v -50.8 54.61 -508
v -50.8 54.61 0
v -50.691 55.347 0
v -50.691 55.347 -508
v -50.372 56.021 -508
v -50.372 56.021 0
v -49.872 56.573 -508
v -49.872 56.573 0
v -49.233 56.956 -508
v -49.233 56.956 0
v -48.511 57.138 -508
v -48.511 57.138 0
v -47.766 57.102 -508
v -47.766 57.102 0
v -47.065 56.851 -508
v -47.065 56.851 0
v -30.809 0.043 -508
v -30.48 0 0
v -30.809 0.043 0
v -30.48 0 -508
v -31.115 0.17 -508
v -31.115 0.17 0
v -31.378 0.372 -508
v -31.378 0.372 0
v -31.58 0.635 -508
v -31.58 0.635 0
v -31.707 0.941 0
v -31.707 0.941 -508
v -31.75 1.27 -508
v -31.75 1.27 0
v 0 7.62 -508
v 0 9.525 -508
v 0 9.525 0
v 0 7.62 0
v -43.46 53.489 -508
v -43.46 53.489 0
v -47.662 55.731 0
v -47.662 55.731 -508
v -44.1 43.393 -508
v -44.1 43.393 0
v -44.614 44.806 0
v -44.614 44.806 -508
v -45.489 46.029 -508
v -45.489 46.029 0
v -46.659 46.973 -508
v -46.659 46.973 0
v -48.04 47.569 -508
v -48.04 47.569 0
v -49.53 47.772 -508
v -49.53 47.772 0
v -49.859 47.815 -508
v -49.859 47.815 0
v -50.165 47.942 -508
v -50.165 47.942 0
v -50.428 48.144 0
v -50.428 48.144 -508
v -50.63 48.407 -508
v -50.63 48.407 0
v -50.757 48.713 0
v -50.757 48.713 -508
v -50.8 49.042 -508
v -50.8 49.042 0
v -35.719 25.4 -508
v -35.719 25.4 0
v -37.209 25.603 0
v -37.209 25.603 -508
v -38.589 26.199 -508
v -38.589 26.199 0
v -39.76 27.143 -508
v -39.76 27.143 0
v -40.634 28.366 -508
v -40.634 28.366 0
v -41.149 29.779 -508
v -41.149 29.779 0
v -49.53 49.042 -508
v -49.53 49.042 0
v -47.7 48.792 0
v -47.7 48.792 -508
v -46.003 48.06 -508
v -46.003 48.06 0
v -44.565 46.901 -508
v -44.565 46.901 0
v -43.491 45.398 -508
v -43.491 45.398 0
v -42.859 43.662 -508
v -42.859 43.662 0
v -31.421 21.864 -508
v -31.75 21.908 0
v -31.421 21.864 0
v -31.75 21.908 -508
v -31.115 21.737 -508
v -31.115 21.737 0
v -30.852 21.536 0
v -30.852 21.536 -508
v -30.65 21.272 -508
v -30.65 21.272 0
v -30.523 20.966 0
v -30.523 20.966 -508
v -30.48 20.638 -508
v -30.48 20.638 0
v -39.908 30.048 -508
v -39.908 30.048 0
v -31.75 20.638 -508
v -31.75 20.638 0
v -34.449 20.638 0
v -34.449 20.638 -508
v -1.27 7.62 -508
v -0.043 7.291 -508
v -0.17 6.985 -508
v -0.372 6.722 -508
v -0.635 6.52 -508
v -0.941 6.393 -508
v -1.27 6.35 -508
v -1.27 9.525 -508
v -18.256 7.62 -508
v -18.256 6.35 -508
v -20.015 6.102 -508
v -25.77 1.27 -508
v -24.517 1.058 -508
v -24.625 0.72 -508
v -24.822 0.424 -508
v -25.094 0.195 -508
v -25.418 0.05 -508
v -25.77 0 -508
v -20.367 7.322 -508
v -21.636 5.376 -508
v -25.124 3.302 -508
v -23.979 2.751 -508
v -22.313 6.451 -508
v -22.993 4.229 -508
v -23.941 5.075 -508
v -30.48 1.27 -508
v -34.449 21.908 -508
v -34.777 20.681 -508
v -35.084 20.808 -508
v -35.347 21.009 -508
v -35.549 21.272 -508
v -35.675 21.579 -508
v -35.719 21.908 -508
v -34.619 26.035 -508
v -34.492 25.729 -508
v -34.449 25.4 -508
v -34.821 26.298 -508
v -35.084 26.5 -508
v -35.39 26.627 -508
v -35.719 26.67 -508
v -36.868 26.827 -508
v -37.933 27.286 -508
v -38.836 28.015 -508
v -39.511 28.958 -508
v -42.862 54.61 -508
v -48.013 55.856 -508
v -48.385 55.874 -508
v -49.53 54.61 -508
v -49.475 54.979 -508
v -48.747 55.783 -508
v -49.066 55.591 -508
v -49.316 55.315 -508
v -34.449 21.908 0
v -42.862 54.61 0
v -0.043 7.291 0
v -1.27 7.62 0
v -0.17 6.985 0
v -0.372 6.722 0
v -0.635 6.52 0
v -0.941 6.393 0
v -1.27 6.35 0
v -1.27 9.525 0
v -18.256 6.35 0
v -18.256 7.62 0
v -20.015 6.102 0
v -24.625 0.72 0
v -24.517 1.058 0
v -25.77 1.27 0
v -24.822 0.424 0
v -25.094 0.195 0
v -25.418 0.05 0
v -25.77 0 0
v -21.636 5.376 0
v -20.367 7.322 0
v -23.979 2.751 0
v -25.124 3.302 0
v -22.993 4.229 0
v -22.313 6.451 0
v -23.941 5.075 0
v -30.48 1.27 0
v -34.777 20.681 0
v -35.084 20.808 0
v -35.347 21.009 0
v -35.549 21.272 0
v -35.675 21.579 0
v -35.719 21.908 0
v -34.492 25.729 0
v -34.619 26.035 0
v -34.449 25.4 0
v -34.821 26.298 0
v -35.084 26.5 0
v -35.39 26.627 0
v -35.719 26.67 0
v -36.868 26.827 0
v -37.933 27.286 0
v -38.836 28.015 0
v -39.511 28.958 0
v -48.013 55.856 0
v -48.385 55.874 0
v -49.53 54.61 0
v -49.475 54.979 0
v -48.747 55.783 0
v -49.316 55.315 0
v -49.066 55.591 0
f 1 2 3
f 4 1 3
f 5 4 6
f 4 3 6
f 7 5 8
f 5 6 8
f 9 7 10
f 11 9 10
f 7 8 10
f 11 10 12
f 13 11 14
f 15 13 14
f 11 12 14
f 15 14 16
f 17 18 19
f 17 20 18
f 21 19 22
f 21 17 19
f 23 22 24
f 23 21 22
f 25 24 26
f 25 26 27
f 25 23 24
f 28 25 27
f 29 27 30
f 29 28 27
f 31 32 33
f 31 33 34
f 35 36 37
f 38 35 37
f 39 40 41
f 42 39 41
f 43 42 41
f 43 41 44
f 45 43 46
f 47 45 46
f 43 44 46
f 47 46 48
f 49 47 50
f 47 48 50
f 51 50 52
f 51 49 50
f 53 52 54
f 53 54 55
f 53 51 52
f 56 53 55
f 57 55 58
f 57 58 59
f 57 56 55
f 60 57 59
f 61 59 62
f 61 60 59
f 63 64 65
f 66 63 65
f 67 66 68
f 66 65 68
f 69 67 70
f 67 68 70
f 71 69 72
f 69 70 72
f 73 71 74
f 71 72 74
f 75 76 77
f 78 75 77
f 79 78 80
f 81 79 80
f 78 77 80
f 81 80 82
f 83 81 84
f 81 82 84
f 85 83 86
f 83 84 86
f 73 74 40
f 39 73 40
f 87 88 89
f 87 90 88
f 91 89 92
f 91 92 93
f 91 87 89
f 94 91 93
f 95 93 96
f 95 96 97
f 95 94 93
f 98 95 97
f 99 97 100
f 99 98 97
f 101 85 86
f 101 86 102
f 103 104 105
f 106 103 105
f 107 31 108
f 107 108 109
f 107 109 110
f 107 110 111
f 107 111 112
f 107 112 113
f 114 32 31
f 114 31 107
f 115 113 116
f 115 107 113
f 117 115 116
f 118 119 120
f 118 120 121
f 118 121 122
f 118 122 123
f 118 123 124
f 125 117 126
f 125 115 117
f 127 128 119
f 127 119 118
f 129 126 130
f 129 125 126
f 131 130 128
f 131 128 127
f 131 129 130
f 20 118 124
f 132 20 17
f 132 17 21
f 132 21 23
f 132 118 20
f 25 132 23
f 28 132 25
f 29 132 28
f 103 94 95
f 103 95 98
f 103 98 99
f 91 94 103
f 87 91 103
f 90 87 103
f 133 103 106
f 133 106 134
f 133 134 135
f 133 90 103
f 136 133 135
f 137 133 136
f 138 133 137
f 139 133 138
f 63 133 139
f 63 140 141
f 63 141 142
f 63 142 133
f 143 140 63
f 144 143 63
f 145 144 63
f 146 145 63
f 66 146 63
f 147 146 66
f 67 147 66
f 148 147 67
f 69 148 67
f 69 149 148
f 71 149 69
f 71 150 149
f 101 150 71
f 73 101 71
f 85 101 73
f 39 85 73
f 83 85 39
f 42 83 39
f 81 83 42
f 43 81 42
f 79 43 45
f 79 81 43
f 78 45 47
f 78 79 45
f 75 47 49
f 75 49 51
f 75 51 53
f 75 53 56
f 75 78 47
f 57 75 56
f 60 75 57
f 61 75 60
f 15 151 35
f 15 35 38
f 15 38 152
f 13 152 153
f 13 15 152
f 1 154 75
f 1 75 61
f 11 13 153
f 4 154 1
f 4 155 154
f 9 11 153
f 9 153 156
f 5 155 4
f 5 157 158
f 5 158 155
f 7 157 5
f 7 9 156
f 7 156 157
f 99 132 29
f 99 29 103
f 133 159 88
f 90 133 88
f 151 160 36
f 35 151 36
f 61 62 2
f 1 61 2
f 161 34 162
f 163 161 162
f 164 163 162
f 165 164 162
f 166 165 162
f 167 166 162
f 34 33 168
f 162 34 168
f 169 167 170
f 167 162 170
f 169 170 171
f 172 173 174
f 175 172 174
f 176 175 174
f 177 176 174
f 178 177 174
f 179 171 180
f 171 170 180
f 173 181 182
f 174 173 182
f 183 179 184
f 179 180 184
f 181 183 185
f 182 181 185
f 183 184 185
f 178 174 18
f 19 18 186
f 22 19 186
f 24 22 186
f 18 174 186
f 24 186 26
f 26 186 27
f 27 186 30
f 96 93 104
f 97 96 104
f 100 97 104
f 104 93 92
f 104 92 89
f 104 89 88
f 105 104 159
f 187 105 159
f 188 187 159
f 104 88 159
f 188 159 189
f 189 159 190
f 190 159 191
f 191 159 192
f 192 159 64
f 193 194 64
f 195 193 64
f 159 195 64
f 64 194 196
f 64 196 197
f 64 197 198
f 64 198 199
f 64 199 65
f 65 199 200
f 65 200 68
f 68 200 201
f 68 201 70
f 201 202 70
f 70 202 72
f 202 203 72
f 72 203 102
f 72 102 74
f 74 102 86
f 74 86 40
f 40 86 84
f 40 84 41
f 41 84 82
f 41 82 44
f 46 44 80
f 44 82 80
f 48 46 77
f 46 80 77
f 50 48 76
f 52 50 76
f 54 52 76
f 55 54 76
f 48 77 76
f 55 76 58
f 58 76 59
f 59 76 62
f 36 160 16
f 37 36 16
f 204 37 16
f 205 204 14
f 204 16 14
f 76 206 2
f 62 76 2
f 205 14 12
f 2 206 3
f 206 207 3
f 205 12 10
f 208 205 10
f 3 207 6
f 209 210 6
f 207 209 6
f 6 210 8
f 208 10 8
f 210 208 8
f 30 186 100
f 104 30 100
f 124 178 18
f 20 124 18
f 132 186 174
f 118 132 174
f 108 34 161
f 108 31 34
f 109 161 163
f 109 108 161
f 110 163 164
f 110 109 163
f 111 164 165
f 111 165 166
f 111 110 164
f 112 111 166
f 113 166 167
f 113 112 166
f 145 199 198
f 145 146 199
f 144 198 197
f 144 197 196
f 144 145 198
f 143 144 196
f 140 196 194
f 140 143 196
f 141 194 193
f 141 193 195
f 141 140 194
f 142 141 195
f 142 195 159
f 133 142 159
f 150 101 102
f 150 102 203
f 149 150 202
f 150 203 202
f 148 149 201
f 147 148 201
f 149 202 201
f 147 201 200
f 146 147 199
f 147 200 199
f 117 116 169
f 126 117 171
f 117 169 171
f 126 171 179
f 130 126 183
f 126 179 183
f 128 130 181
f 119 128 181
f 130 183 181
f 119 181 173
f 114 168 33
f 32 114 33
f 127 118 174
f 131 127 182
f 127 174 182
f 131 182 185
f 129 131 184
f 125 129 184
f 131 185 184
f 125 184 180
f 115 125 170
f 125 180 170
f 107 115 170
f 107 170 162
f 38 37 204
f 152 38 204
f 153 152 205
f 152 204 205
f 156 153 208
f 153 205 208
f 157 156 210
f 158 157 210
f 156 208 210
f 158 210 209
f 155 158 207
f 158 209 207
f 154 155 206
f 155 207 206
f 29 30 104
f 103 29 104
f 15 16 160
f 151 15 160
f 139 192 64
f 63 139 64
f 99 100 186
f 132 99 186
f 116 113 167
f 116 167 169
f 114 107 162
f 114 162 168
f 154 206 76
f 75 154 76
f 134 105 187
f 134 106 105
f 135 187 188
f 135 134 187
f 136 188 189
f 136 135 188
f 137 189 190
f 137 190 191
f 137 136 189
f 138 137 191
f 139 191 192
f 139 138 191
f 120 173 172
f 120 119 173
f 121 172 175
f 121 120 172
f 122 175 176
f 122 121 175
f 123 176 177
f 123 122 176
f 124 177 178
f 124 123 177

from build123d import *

# Parameters (mm, degrees)
EXTRUDE_THIN1_DEPTH = 508
FILLET1_R           = 1.27


with BuildPart() as part:
    # Sketch1 → Extrude-Thin1 (new body)
    with BuildSketch(Plane.XY):
        with BuildLine():
            Line((0, 9.525), (0, 6.35))
            Line((0, 6.35), (-18.25625, 6.35))
            ThreePointArc((-18.25625, 6.35), (-22.746378061, 4.490128061), (-24.60625, 0))
            Line((-24.60625, 0), (-31.75, 0))
            Line((-31.75, 0), (-31.75, 20.6375))
            Line((-31.75, 20.6375), (-35.71875, 20.6375))
            Line((-35.71875, 20.6375), (-35.71875, 25.4))
            ThreePointArc((-35.71875, 25.4), (-39.20672008, 26.631209101), (-41.148892003, 29.779189303))
            Line((-41.148892003, 29.779189303), (-44.099857997, 43.392900498))
            ThreePointArc((-44.099857997, 43.392900498), (-46.562785495, 46.913451124), (-50.8, 47.625))
            Line((-50.8, 47.625), (-50.8, 54.61))
            ThreePointArc((-50.8, 54.61), (-49.566819219, 56.788032031), (-47.064705882, 56.851176471))
            Line((-47.064705882, 56.851176471), (-42.8625, 54.61))
            Line((-42.8625, 54.61), (-43.460147059, 53.489411765))
            Line((-43.460147059, 53.489411765), (-47.662352941, 55.730588235))
            ThreePointArc((-47.662352941, 55.730588235), (-48.913409609, 55.699016016), (-49.53, 54.61))
            Line((-49.53, 54.61), (-49.53, 49.042089801))
            ThreePointArc((-49.53, 49.042089801), (-45.244779615, 47.529461477), (-42.858682681, 43.661942943))
            Line((-42.858682681, 43.661942943), (-39.907716688, 30.048231748))
            ThreePointArc((-39.907716688, 30.048231748), (-37.879157823, 27.254280646), (-34.44875, 26.862469466))
            Line((-34.44875, 26.862469466), (-34.44875, 21.9075))
            Line((-34.44875, 21.9075), (-30.48, 21.9075))
            Line((-30.48, 21.9075), (-30.48, 1.27))
            Line((-30.48, 1.27), (-25.769671325, 1.27))
            ThreePointArc((-25.769671325, 1.27), (-23.17493885, 5.819871133), (-18.25625, 7.62))
            Line((-18.25625, 7.62), (-1.27, 7.62))
            Line((-1.27, 7.62), (-1.27, 9.525))
            Line((-1.27, 9.525), (0, 9.525))
        make_face()
    extrude(amount=-EXTRUDE_THIN1_DEPTH)

    # Fillet1
    fillet1_edges = [part.edges().sort_by_distance(p)[0] for p in [
        (-34.44875, 26.862469466, -254),
        (-30.48, 21.9075, -254),
        (0, 6.35, -254),
        (-24.60625, 0, -254),
        (-31.75, 0, -254),
        (-35.71875, 20.6375, -254),
        (-50.8, 47.625, -254),
    ]]
    fillet(fillet1_edges, radius=FILLET1_R)


solid = part.part
